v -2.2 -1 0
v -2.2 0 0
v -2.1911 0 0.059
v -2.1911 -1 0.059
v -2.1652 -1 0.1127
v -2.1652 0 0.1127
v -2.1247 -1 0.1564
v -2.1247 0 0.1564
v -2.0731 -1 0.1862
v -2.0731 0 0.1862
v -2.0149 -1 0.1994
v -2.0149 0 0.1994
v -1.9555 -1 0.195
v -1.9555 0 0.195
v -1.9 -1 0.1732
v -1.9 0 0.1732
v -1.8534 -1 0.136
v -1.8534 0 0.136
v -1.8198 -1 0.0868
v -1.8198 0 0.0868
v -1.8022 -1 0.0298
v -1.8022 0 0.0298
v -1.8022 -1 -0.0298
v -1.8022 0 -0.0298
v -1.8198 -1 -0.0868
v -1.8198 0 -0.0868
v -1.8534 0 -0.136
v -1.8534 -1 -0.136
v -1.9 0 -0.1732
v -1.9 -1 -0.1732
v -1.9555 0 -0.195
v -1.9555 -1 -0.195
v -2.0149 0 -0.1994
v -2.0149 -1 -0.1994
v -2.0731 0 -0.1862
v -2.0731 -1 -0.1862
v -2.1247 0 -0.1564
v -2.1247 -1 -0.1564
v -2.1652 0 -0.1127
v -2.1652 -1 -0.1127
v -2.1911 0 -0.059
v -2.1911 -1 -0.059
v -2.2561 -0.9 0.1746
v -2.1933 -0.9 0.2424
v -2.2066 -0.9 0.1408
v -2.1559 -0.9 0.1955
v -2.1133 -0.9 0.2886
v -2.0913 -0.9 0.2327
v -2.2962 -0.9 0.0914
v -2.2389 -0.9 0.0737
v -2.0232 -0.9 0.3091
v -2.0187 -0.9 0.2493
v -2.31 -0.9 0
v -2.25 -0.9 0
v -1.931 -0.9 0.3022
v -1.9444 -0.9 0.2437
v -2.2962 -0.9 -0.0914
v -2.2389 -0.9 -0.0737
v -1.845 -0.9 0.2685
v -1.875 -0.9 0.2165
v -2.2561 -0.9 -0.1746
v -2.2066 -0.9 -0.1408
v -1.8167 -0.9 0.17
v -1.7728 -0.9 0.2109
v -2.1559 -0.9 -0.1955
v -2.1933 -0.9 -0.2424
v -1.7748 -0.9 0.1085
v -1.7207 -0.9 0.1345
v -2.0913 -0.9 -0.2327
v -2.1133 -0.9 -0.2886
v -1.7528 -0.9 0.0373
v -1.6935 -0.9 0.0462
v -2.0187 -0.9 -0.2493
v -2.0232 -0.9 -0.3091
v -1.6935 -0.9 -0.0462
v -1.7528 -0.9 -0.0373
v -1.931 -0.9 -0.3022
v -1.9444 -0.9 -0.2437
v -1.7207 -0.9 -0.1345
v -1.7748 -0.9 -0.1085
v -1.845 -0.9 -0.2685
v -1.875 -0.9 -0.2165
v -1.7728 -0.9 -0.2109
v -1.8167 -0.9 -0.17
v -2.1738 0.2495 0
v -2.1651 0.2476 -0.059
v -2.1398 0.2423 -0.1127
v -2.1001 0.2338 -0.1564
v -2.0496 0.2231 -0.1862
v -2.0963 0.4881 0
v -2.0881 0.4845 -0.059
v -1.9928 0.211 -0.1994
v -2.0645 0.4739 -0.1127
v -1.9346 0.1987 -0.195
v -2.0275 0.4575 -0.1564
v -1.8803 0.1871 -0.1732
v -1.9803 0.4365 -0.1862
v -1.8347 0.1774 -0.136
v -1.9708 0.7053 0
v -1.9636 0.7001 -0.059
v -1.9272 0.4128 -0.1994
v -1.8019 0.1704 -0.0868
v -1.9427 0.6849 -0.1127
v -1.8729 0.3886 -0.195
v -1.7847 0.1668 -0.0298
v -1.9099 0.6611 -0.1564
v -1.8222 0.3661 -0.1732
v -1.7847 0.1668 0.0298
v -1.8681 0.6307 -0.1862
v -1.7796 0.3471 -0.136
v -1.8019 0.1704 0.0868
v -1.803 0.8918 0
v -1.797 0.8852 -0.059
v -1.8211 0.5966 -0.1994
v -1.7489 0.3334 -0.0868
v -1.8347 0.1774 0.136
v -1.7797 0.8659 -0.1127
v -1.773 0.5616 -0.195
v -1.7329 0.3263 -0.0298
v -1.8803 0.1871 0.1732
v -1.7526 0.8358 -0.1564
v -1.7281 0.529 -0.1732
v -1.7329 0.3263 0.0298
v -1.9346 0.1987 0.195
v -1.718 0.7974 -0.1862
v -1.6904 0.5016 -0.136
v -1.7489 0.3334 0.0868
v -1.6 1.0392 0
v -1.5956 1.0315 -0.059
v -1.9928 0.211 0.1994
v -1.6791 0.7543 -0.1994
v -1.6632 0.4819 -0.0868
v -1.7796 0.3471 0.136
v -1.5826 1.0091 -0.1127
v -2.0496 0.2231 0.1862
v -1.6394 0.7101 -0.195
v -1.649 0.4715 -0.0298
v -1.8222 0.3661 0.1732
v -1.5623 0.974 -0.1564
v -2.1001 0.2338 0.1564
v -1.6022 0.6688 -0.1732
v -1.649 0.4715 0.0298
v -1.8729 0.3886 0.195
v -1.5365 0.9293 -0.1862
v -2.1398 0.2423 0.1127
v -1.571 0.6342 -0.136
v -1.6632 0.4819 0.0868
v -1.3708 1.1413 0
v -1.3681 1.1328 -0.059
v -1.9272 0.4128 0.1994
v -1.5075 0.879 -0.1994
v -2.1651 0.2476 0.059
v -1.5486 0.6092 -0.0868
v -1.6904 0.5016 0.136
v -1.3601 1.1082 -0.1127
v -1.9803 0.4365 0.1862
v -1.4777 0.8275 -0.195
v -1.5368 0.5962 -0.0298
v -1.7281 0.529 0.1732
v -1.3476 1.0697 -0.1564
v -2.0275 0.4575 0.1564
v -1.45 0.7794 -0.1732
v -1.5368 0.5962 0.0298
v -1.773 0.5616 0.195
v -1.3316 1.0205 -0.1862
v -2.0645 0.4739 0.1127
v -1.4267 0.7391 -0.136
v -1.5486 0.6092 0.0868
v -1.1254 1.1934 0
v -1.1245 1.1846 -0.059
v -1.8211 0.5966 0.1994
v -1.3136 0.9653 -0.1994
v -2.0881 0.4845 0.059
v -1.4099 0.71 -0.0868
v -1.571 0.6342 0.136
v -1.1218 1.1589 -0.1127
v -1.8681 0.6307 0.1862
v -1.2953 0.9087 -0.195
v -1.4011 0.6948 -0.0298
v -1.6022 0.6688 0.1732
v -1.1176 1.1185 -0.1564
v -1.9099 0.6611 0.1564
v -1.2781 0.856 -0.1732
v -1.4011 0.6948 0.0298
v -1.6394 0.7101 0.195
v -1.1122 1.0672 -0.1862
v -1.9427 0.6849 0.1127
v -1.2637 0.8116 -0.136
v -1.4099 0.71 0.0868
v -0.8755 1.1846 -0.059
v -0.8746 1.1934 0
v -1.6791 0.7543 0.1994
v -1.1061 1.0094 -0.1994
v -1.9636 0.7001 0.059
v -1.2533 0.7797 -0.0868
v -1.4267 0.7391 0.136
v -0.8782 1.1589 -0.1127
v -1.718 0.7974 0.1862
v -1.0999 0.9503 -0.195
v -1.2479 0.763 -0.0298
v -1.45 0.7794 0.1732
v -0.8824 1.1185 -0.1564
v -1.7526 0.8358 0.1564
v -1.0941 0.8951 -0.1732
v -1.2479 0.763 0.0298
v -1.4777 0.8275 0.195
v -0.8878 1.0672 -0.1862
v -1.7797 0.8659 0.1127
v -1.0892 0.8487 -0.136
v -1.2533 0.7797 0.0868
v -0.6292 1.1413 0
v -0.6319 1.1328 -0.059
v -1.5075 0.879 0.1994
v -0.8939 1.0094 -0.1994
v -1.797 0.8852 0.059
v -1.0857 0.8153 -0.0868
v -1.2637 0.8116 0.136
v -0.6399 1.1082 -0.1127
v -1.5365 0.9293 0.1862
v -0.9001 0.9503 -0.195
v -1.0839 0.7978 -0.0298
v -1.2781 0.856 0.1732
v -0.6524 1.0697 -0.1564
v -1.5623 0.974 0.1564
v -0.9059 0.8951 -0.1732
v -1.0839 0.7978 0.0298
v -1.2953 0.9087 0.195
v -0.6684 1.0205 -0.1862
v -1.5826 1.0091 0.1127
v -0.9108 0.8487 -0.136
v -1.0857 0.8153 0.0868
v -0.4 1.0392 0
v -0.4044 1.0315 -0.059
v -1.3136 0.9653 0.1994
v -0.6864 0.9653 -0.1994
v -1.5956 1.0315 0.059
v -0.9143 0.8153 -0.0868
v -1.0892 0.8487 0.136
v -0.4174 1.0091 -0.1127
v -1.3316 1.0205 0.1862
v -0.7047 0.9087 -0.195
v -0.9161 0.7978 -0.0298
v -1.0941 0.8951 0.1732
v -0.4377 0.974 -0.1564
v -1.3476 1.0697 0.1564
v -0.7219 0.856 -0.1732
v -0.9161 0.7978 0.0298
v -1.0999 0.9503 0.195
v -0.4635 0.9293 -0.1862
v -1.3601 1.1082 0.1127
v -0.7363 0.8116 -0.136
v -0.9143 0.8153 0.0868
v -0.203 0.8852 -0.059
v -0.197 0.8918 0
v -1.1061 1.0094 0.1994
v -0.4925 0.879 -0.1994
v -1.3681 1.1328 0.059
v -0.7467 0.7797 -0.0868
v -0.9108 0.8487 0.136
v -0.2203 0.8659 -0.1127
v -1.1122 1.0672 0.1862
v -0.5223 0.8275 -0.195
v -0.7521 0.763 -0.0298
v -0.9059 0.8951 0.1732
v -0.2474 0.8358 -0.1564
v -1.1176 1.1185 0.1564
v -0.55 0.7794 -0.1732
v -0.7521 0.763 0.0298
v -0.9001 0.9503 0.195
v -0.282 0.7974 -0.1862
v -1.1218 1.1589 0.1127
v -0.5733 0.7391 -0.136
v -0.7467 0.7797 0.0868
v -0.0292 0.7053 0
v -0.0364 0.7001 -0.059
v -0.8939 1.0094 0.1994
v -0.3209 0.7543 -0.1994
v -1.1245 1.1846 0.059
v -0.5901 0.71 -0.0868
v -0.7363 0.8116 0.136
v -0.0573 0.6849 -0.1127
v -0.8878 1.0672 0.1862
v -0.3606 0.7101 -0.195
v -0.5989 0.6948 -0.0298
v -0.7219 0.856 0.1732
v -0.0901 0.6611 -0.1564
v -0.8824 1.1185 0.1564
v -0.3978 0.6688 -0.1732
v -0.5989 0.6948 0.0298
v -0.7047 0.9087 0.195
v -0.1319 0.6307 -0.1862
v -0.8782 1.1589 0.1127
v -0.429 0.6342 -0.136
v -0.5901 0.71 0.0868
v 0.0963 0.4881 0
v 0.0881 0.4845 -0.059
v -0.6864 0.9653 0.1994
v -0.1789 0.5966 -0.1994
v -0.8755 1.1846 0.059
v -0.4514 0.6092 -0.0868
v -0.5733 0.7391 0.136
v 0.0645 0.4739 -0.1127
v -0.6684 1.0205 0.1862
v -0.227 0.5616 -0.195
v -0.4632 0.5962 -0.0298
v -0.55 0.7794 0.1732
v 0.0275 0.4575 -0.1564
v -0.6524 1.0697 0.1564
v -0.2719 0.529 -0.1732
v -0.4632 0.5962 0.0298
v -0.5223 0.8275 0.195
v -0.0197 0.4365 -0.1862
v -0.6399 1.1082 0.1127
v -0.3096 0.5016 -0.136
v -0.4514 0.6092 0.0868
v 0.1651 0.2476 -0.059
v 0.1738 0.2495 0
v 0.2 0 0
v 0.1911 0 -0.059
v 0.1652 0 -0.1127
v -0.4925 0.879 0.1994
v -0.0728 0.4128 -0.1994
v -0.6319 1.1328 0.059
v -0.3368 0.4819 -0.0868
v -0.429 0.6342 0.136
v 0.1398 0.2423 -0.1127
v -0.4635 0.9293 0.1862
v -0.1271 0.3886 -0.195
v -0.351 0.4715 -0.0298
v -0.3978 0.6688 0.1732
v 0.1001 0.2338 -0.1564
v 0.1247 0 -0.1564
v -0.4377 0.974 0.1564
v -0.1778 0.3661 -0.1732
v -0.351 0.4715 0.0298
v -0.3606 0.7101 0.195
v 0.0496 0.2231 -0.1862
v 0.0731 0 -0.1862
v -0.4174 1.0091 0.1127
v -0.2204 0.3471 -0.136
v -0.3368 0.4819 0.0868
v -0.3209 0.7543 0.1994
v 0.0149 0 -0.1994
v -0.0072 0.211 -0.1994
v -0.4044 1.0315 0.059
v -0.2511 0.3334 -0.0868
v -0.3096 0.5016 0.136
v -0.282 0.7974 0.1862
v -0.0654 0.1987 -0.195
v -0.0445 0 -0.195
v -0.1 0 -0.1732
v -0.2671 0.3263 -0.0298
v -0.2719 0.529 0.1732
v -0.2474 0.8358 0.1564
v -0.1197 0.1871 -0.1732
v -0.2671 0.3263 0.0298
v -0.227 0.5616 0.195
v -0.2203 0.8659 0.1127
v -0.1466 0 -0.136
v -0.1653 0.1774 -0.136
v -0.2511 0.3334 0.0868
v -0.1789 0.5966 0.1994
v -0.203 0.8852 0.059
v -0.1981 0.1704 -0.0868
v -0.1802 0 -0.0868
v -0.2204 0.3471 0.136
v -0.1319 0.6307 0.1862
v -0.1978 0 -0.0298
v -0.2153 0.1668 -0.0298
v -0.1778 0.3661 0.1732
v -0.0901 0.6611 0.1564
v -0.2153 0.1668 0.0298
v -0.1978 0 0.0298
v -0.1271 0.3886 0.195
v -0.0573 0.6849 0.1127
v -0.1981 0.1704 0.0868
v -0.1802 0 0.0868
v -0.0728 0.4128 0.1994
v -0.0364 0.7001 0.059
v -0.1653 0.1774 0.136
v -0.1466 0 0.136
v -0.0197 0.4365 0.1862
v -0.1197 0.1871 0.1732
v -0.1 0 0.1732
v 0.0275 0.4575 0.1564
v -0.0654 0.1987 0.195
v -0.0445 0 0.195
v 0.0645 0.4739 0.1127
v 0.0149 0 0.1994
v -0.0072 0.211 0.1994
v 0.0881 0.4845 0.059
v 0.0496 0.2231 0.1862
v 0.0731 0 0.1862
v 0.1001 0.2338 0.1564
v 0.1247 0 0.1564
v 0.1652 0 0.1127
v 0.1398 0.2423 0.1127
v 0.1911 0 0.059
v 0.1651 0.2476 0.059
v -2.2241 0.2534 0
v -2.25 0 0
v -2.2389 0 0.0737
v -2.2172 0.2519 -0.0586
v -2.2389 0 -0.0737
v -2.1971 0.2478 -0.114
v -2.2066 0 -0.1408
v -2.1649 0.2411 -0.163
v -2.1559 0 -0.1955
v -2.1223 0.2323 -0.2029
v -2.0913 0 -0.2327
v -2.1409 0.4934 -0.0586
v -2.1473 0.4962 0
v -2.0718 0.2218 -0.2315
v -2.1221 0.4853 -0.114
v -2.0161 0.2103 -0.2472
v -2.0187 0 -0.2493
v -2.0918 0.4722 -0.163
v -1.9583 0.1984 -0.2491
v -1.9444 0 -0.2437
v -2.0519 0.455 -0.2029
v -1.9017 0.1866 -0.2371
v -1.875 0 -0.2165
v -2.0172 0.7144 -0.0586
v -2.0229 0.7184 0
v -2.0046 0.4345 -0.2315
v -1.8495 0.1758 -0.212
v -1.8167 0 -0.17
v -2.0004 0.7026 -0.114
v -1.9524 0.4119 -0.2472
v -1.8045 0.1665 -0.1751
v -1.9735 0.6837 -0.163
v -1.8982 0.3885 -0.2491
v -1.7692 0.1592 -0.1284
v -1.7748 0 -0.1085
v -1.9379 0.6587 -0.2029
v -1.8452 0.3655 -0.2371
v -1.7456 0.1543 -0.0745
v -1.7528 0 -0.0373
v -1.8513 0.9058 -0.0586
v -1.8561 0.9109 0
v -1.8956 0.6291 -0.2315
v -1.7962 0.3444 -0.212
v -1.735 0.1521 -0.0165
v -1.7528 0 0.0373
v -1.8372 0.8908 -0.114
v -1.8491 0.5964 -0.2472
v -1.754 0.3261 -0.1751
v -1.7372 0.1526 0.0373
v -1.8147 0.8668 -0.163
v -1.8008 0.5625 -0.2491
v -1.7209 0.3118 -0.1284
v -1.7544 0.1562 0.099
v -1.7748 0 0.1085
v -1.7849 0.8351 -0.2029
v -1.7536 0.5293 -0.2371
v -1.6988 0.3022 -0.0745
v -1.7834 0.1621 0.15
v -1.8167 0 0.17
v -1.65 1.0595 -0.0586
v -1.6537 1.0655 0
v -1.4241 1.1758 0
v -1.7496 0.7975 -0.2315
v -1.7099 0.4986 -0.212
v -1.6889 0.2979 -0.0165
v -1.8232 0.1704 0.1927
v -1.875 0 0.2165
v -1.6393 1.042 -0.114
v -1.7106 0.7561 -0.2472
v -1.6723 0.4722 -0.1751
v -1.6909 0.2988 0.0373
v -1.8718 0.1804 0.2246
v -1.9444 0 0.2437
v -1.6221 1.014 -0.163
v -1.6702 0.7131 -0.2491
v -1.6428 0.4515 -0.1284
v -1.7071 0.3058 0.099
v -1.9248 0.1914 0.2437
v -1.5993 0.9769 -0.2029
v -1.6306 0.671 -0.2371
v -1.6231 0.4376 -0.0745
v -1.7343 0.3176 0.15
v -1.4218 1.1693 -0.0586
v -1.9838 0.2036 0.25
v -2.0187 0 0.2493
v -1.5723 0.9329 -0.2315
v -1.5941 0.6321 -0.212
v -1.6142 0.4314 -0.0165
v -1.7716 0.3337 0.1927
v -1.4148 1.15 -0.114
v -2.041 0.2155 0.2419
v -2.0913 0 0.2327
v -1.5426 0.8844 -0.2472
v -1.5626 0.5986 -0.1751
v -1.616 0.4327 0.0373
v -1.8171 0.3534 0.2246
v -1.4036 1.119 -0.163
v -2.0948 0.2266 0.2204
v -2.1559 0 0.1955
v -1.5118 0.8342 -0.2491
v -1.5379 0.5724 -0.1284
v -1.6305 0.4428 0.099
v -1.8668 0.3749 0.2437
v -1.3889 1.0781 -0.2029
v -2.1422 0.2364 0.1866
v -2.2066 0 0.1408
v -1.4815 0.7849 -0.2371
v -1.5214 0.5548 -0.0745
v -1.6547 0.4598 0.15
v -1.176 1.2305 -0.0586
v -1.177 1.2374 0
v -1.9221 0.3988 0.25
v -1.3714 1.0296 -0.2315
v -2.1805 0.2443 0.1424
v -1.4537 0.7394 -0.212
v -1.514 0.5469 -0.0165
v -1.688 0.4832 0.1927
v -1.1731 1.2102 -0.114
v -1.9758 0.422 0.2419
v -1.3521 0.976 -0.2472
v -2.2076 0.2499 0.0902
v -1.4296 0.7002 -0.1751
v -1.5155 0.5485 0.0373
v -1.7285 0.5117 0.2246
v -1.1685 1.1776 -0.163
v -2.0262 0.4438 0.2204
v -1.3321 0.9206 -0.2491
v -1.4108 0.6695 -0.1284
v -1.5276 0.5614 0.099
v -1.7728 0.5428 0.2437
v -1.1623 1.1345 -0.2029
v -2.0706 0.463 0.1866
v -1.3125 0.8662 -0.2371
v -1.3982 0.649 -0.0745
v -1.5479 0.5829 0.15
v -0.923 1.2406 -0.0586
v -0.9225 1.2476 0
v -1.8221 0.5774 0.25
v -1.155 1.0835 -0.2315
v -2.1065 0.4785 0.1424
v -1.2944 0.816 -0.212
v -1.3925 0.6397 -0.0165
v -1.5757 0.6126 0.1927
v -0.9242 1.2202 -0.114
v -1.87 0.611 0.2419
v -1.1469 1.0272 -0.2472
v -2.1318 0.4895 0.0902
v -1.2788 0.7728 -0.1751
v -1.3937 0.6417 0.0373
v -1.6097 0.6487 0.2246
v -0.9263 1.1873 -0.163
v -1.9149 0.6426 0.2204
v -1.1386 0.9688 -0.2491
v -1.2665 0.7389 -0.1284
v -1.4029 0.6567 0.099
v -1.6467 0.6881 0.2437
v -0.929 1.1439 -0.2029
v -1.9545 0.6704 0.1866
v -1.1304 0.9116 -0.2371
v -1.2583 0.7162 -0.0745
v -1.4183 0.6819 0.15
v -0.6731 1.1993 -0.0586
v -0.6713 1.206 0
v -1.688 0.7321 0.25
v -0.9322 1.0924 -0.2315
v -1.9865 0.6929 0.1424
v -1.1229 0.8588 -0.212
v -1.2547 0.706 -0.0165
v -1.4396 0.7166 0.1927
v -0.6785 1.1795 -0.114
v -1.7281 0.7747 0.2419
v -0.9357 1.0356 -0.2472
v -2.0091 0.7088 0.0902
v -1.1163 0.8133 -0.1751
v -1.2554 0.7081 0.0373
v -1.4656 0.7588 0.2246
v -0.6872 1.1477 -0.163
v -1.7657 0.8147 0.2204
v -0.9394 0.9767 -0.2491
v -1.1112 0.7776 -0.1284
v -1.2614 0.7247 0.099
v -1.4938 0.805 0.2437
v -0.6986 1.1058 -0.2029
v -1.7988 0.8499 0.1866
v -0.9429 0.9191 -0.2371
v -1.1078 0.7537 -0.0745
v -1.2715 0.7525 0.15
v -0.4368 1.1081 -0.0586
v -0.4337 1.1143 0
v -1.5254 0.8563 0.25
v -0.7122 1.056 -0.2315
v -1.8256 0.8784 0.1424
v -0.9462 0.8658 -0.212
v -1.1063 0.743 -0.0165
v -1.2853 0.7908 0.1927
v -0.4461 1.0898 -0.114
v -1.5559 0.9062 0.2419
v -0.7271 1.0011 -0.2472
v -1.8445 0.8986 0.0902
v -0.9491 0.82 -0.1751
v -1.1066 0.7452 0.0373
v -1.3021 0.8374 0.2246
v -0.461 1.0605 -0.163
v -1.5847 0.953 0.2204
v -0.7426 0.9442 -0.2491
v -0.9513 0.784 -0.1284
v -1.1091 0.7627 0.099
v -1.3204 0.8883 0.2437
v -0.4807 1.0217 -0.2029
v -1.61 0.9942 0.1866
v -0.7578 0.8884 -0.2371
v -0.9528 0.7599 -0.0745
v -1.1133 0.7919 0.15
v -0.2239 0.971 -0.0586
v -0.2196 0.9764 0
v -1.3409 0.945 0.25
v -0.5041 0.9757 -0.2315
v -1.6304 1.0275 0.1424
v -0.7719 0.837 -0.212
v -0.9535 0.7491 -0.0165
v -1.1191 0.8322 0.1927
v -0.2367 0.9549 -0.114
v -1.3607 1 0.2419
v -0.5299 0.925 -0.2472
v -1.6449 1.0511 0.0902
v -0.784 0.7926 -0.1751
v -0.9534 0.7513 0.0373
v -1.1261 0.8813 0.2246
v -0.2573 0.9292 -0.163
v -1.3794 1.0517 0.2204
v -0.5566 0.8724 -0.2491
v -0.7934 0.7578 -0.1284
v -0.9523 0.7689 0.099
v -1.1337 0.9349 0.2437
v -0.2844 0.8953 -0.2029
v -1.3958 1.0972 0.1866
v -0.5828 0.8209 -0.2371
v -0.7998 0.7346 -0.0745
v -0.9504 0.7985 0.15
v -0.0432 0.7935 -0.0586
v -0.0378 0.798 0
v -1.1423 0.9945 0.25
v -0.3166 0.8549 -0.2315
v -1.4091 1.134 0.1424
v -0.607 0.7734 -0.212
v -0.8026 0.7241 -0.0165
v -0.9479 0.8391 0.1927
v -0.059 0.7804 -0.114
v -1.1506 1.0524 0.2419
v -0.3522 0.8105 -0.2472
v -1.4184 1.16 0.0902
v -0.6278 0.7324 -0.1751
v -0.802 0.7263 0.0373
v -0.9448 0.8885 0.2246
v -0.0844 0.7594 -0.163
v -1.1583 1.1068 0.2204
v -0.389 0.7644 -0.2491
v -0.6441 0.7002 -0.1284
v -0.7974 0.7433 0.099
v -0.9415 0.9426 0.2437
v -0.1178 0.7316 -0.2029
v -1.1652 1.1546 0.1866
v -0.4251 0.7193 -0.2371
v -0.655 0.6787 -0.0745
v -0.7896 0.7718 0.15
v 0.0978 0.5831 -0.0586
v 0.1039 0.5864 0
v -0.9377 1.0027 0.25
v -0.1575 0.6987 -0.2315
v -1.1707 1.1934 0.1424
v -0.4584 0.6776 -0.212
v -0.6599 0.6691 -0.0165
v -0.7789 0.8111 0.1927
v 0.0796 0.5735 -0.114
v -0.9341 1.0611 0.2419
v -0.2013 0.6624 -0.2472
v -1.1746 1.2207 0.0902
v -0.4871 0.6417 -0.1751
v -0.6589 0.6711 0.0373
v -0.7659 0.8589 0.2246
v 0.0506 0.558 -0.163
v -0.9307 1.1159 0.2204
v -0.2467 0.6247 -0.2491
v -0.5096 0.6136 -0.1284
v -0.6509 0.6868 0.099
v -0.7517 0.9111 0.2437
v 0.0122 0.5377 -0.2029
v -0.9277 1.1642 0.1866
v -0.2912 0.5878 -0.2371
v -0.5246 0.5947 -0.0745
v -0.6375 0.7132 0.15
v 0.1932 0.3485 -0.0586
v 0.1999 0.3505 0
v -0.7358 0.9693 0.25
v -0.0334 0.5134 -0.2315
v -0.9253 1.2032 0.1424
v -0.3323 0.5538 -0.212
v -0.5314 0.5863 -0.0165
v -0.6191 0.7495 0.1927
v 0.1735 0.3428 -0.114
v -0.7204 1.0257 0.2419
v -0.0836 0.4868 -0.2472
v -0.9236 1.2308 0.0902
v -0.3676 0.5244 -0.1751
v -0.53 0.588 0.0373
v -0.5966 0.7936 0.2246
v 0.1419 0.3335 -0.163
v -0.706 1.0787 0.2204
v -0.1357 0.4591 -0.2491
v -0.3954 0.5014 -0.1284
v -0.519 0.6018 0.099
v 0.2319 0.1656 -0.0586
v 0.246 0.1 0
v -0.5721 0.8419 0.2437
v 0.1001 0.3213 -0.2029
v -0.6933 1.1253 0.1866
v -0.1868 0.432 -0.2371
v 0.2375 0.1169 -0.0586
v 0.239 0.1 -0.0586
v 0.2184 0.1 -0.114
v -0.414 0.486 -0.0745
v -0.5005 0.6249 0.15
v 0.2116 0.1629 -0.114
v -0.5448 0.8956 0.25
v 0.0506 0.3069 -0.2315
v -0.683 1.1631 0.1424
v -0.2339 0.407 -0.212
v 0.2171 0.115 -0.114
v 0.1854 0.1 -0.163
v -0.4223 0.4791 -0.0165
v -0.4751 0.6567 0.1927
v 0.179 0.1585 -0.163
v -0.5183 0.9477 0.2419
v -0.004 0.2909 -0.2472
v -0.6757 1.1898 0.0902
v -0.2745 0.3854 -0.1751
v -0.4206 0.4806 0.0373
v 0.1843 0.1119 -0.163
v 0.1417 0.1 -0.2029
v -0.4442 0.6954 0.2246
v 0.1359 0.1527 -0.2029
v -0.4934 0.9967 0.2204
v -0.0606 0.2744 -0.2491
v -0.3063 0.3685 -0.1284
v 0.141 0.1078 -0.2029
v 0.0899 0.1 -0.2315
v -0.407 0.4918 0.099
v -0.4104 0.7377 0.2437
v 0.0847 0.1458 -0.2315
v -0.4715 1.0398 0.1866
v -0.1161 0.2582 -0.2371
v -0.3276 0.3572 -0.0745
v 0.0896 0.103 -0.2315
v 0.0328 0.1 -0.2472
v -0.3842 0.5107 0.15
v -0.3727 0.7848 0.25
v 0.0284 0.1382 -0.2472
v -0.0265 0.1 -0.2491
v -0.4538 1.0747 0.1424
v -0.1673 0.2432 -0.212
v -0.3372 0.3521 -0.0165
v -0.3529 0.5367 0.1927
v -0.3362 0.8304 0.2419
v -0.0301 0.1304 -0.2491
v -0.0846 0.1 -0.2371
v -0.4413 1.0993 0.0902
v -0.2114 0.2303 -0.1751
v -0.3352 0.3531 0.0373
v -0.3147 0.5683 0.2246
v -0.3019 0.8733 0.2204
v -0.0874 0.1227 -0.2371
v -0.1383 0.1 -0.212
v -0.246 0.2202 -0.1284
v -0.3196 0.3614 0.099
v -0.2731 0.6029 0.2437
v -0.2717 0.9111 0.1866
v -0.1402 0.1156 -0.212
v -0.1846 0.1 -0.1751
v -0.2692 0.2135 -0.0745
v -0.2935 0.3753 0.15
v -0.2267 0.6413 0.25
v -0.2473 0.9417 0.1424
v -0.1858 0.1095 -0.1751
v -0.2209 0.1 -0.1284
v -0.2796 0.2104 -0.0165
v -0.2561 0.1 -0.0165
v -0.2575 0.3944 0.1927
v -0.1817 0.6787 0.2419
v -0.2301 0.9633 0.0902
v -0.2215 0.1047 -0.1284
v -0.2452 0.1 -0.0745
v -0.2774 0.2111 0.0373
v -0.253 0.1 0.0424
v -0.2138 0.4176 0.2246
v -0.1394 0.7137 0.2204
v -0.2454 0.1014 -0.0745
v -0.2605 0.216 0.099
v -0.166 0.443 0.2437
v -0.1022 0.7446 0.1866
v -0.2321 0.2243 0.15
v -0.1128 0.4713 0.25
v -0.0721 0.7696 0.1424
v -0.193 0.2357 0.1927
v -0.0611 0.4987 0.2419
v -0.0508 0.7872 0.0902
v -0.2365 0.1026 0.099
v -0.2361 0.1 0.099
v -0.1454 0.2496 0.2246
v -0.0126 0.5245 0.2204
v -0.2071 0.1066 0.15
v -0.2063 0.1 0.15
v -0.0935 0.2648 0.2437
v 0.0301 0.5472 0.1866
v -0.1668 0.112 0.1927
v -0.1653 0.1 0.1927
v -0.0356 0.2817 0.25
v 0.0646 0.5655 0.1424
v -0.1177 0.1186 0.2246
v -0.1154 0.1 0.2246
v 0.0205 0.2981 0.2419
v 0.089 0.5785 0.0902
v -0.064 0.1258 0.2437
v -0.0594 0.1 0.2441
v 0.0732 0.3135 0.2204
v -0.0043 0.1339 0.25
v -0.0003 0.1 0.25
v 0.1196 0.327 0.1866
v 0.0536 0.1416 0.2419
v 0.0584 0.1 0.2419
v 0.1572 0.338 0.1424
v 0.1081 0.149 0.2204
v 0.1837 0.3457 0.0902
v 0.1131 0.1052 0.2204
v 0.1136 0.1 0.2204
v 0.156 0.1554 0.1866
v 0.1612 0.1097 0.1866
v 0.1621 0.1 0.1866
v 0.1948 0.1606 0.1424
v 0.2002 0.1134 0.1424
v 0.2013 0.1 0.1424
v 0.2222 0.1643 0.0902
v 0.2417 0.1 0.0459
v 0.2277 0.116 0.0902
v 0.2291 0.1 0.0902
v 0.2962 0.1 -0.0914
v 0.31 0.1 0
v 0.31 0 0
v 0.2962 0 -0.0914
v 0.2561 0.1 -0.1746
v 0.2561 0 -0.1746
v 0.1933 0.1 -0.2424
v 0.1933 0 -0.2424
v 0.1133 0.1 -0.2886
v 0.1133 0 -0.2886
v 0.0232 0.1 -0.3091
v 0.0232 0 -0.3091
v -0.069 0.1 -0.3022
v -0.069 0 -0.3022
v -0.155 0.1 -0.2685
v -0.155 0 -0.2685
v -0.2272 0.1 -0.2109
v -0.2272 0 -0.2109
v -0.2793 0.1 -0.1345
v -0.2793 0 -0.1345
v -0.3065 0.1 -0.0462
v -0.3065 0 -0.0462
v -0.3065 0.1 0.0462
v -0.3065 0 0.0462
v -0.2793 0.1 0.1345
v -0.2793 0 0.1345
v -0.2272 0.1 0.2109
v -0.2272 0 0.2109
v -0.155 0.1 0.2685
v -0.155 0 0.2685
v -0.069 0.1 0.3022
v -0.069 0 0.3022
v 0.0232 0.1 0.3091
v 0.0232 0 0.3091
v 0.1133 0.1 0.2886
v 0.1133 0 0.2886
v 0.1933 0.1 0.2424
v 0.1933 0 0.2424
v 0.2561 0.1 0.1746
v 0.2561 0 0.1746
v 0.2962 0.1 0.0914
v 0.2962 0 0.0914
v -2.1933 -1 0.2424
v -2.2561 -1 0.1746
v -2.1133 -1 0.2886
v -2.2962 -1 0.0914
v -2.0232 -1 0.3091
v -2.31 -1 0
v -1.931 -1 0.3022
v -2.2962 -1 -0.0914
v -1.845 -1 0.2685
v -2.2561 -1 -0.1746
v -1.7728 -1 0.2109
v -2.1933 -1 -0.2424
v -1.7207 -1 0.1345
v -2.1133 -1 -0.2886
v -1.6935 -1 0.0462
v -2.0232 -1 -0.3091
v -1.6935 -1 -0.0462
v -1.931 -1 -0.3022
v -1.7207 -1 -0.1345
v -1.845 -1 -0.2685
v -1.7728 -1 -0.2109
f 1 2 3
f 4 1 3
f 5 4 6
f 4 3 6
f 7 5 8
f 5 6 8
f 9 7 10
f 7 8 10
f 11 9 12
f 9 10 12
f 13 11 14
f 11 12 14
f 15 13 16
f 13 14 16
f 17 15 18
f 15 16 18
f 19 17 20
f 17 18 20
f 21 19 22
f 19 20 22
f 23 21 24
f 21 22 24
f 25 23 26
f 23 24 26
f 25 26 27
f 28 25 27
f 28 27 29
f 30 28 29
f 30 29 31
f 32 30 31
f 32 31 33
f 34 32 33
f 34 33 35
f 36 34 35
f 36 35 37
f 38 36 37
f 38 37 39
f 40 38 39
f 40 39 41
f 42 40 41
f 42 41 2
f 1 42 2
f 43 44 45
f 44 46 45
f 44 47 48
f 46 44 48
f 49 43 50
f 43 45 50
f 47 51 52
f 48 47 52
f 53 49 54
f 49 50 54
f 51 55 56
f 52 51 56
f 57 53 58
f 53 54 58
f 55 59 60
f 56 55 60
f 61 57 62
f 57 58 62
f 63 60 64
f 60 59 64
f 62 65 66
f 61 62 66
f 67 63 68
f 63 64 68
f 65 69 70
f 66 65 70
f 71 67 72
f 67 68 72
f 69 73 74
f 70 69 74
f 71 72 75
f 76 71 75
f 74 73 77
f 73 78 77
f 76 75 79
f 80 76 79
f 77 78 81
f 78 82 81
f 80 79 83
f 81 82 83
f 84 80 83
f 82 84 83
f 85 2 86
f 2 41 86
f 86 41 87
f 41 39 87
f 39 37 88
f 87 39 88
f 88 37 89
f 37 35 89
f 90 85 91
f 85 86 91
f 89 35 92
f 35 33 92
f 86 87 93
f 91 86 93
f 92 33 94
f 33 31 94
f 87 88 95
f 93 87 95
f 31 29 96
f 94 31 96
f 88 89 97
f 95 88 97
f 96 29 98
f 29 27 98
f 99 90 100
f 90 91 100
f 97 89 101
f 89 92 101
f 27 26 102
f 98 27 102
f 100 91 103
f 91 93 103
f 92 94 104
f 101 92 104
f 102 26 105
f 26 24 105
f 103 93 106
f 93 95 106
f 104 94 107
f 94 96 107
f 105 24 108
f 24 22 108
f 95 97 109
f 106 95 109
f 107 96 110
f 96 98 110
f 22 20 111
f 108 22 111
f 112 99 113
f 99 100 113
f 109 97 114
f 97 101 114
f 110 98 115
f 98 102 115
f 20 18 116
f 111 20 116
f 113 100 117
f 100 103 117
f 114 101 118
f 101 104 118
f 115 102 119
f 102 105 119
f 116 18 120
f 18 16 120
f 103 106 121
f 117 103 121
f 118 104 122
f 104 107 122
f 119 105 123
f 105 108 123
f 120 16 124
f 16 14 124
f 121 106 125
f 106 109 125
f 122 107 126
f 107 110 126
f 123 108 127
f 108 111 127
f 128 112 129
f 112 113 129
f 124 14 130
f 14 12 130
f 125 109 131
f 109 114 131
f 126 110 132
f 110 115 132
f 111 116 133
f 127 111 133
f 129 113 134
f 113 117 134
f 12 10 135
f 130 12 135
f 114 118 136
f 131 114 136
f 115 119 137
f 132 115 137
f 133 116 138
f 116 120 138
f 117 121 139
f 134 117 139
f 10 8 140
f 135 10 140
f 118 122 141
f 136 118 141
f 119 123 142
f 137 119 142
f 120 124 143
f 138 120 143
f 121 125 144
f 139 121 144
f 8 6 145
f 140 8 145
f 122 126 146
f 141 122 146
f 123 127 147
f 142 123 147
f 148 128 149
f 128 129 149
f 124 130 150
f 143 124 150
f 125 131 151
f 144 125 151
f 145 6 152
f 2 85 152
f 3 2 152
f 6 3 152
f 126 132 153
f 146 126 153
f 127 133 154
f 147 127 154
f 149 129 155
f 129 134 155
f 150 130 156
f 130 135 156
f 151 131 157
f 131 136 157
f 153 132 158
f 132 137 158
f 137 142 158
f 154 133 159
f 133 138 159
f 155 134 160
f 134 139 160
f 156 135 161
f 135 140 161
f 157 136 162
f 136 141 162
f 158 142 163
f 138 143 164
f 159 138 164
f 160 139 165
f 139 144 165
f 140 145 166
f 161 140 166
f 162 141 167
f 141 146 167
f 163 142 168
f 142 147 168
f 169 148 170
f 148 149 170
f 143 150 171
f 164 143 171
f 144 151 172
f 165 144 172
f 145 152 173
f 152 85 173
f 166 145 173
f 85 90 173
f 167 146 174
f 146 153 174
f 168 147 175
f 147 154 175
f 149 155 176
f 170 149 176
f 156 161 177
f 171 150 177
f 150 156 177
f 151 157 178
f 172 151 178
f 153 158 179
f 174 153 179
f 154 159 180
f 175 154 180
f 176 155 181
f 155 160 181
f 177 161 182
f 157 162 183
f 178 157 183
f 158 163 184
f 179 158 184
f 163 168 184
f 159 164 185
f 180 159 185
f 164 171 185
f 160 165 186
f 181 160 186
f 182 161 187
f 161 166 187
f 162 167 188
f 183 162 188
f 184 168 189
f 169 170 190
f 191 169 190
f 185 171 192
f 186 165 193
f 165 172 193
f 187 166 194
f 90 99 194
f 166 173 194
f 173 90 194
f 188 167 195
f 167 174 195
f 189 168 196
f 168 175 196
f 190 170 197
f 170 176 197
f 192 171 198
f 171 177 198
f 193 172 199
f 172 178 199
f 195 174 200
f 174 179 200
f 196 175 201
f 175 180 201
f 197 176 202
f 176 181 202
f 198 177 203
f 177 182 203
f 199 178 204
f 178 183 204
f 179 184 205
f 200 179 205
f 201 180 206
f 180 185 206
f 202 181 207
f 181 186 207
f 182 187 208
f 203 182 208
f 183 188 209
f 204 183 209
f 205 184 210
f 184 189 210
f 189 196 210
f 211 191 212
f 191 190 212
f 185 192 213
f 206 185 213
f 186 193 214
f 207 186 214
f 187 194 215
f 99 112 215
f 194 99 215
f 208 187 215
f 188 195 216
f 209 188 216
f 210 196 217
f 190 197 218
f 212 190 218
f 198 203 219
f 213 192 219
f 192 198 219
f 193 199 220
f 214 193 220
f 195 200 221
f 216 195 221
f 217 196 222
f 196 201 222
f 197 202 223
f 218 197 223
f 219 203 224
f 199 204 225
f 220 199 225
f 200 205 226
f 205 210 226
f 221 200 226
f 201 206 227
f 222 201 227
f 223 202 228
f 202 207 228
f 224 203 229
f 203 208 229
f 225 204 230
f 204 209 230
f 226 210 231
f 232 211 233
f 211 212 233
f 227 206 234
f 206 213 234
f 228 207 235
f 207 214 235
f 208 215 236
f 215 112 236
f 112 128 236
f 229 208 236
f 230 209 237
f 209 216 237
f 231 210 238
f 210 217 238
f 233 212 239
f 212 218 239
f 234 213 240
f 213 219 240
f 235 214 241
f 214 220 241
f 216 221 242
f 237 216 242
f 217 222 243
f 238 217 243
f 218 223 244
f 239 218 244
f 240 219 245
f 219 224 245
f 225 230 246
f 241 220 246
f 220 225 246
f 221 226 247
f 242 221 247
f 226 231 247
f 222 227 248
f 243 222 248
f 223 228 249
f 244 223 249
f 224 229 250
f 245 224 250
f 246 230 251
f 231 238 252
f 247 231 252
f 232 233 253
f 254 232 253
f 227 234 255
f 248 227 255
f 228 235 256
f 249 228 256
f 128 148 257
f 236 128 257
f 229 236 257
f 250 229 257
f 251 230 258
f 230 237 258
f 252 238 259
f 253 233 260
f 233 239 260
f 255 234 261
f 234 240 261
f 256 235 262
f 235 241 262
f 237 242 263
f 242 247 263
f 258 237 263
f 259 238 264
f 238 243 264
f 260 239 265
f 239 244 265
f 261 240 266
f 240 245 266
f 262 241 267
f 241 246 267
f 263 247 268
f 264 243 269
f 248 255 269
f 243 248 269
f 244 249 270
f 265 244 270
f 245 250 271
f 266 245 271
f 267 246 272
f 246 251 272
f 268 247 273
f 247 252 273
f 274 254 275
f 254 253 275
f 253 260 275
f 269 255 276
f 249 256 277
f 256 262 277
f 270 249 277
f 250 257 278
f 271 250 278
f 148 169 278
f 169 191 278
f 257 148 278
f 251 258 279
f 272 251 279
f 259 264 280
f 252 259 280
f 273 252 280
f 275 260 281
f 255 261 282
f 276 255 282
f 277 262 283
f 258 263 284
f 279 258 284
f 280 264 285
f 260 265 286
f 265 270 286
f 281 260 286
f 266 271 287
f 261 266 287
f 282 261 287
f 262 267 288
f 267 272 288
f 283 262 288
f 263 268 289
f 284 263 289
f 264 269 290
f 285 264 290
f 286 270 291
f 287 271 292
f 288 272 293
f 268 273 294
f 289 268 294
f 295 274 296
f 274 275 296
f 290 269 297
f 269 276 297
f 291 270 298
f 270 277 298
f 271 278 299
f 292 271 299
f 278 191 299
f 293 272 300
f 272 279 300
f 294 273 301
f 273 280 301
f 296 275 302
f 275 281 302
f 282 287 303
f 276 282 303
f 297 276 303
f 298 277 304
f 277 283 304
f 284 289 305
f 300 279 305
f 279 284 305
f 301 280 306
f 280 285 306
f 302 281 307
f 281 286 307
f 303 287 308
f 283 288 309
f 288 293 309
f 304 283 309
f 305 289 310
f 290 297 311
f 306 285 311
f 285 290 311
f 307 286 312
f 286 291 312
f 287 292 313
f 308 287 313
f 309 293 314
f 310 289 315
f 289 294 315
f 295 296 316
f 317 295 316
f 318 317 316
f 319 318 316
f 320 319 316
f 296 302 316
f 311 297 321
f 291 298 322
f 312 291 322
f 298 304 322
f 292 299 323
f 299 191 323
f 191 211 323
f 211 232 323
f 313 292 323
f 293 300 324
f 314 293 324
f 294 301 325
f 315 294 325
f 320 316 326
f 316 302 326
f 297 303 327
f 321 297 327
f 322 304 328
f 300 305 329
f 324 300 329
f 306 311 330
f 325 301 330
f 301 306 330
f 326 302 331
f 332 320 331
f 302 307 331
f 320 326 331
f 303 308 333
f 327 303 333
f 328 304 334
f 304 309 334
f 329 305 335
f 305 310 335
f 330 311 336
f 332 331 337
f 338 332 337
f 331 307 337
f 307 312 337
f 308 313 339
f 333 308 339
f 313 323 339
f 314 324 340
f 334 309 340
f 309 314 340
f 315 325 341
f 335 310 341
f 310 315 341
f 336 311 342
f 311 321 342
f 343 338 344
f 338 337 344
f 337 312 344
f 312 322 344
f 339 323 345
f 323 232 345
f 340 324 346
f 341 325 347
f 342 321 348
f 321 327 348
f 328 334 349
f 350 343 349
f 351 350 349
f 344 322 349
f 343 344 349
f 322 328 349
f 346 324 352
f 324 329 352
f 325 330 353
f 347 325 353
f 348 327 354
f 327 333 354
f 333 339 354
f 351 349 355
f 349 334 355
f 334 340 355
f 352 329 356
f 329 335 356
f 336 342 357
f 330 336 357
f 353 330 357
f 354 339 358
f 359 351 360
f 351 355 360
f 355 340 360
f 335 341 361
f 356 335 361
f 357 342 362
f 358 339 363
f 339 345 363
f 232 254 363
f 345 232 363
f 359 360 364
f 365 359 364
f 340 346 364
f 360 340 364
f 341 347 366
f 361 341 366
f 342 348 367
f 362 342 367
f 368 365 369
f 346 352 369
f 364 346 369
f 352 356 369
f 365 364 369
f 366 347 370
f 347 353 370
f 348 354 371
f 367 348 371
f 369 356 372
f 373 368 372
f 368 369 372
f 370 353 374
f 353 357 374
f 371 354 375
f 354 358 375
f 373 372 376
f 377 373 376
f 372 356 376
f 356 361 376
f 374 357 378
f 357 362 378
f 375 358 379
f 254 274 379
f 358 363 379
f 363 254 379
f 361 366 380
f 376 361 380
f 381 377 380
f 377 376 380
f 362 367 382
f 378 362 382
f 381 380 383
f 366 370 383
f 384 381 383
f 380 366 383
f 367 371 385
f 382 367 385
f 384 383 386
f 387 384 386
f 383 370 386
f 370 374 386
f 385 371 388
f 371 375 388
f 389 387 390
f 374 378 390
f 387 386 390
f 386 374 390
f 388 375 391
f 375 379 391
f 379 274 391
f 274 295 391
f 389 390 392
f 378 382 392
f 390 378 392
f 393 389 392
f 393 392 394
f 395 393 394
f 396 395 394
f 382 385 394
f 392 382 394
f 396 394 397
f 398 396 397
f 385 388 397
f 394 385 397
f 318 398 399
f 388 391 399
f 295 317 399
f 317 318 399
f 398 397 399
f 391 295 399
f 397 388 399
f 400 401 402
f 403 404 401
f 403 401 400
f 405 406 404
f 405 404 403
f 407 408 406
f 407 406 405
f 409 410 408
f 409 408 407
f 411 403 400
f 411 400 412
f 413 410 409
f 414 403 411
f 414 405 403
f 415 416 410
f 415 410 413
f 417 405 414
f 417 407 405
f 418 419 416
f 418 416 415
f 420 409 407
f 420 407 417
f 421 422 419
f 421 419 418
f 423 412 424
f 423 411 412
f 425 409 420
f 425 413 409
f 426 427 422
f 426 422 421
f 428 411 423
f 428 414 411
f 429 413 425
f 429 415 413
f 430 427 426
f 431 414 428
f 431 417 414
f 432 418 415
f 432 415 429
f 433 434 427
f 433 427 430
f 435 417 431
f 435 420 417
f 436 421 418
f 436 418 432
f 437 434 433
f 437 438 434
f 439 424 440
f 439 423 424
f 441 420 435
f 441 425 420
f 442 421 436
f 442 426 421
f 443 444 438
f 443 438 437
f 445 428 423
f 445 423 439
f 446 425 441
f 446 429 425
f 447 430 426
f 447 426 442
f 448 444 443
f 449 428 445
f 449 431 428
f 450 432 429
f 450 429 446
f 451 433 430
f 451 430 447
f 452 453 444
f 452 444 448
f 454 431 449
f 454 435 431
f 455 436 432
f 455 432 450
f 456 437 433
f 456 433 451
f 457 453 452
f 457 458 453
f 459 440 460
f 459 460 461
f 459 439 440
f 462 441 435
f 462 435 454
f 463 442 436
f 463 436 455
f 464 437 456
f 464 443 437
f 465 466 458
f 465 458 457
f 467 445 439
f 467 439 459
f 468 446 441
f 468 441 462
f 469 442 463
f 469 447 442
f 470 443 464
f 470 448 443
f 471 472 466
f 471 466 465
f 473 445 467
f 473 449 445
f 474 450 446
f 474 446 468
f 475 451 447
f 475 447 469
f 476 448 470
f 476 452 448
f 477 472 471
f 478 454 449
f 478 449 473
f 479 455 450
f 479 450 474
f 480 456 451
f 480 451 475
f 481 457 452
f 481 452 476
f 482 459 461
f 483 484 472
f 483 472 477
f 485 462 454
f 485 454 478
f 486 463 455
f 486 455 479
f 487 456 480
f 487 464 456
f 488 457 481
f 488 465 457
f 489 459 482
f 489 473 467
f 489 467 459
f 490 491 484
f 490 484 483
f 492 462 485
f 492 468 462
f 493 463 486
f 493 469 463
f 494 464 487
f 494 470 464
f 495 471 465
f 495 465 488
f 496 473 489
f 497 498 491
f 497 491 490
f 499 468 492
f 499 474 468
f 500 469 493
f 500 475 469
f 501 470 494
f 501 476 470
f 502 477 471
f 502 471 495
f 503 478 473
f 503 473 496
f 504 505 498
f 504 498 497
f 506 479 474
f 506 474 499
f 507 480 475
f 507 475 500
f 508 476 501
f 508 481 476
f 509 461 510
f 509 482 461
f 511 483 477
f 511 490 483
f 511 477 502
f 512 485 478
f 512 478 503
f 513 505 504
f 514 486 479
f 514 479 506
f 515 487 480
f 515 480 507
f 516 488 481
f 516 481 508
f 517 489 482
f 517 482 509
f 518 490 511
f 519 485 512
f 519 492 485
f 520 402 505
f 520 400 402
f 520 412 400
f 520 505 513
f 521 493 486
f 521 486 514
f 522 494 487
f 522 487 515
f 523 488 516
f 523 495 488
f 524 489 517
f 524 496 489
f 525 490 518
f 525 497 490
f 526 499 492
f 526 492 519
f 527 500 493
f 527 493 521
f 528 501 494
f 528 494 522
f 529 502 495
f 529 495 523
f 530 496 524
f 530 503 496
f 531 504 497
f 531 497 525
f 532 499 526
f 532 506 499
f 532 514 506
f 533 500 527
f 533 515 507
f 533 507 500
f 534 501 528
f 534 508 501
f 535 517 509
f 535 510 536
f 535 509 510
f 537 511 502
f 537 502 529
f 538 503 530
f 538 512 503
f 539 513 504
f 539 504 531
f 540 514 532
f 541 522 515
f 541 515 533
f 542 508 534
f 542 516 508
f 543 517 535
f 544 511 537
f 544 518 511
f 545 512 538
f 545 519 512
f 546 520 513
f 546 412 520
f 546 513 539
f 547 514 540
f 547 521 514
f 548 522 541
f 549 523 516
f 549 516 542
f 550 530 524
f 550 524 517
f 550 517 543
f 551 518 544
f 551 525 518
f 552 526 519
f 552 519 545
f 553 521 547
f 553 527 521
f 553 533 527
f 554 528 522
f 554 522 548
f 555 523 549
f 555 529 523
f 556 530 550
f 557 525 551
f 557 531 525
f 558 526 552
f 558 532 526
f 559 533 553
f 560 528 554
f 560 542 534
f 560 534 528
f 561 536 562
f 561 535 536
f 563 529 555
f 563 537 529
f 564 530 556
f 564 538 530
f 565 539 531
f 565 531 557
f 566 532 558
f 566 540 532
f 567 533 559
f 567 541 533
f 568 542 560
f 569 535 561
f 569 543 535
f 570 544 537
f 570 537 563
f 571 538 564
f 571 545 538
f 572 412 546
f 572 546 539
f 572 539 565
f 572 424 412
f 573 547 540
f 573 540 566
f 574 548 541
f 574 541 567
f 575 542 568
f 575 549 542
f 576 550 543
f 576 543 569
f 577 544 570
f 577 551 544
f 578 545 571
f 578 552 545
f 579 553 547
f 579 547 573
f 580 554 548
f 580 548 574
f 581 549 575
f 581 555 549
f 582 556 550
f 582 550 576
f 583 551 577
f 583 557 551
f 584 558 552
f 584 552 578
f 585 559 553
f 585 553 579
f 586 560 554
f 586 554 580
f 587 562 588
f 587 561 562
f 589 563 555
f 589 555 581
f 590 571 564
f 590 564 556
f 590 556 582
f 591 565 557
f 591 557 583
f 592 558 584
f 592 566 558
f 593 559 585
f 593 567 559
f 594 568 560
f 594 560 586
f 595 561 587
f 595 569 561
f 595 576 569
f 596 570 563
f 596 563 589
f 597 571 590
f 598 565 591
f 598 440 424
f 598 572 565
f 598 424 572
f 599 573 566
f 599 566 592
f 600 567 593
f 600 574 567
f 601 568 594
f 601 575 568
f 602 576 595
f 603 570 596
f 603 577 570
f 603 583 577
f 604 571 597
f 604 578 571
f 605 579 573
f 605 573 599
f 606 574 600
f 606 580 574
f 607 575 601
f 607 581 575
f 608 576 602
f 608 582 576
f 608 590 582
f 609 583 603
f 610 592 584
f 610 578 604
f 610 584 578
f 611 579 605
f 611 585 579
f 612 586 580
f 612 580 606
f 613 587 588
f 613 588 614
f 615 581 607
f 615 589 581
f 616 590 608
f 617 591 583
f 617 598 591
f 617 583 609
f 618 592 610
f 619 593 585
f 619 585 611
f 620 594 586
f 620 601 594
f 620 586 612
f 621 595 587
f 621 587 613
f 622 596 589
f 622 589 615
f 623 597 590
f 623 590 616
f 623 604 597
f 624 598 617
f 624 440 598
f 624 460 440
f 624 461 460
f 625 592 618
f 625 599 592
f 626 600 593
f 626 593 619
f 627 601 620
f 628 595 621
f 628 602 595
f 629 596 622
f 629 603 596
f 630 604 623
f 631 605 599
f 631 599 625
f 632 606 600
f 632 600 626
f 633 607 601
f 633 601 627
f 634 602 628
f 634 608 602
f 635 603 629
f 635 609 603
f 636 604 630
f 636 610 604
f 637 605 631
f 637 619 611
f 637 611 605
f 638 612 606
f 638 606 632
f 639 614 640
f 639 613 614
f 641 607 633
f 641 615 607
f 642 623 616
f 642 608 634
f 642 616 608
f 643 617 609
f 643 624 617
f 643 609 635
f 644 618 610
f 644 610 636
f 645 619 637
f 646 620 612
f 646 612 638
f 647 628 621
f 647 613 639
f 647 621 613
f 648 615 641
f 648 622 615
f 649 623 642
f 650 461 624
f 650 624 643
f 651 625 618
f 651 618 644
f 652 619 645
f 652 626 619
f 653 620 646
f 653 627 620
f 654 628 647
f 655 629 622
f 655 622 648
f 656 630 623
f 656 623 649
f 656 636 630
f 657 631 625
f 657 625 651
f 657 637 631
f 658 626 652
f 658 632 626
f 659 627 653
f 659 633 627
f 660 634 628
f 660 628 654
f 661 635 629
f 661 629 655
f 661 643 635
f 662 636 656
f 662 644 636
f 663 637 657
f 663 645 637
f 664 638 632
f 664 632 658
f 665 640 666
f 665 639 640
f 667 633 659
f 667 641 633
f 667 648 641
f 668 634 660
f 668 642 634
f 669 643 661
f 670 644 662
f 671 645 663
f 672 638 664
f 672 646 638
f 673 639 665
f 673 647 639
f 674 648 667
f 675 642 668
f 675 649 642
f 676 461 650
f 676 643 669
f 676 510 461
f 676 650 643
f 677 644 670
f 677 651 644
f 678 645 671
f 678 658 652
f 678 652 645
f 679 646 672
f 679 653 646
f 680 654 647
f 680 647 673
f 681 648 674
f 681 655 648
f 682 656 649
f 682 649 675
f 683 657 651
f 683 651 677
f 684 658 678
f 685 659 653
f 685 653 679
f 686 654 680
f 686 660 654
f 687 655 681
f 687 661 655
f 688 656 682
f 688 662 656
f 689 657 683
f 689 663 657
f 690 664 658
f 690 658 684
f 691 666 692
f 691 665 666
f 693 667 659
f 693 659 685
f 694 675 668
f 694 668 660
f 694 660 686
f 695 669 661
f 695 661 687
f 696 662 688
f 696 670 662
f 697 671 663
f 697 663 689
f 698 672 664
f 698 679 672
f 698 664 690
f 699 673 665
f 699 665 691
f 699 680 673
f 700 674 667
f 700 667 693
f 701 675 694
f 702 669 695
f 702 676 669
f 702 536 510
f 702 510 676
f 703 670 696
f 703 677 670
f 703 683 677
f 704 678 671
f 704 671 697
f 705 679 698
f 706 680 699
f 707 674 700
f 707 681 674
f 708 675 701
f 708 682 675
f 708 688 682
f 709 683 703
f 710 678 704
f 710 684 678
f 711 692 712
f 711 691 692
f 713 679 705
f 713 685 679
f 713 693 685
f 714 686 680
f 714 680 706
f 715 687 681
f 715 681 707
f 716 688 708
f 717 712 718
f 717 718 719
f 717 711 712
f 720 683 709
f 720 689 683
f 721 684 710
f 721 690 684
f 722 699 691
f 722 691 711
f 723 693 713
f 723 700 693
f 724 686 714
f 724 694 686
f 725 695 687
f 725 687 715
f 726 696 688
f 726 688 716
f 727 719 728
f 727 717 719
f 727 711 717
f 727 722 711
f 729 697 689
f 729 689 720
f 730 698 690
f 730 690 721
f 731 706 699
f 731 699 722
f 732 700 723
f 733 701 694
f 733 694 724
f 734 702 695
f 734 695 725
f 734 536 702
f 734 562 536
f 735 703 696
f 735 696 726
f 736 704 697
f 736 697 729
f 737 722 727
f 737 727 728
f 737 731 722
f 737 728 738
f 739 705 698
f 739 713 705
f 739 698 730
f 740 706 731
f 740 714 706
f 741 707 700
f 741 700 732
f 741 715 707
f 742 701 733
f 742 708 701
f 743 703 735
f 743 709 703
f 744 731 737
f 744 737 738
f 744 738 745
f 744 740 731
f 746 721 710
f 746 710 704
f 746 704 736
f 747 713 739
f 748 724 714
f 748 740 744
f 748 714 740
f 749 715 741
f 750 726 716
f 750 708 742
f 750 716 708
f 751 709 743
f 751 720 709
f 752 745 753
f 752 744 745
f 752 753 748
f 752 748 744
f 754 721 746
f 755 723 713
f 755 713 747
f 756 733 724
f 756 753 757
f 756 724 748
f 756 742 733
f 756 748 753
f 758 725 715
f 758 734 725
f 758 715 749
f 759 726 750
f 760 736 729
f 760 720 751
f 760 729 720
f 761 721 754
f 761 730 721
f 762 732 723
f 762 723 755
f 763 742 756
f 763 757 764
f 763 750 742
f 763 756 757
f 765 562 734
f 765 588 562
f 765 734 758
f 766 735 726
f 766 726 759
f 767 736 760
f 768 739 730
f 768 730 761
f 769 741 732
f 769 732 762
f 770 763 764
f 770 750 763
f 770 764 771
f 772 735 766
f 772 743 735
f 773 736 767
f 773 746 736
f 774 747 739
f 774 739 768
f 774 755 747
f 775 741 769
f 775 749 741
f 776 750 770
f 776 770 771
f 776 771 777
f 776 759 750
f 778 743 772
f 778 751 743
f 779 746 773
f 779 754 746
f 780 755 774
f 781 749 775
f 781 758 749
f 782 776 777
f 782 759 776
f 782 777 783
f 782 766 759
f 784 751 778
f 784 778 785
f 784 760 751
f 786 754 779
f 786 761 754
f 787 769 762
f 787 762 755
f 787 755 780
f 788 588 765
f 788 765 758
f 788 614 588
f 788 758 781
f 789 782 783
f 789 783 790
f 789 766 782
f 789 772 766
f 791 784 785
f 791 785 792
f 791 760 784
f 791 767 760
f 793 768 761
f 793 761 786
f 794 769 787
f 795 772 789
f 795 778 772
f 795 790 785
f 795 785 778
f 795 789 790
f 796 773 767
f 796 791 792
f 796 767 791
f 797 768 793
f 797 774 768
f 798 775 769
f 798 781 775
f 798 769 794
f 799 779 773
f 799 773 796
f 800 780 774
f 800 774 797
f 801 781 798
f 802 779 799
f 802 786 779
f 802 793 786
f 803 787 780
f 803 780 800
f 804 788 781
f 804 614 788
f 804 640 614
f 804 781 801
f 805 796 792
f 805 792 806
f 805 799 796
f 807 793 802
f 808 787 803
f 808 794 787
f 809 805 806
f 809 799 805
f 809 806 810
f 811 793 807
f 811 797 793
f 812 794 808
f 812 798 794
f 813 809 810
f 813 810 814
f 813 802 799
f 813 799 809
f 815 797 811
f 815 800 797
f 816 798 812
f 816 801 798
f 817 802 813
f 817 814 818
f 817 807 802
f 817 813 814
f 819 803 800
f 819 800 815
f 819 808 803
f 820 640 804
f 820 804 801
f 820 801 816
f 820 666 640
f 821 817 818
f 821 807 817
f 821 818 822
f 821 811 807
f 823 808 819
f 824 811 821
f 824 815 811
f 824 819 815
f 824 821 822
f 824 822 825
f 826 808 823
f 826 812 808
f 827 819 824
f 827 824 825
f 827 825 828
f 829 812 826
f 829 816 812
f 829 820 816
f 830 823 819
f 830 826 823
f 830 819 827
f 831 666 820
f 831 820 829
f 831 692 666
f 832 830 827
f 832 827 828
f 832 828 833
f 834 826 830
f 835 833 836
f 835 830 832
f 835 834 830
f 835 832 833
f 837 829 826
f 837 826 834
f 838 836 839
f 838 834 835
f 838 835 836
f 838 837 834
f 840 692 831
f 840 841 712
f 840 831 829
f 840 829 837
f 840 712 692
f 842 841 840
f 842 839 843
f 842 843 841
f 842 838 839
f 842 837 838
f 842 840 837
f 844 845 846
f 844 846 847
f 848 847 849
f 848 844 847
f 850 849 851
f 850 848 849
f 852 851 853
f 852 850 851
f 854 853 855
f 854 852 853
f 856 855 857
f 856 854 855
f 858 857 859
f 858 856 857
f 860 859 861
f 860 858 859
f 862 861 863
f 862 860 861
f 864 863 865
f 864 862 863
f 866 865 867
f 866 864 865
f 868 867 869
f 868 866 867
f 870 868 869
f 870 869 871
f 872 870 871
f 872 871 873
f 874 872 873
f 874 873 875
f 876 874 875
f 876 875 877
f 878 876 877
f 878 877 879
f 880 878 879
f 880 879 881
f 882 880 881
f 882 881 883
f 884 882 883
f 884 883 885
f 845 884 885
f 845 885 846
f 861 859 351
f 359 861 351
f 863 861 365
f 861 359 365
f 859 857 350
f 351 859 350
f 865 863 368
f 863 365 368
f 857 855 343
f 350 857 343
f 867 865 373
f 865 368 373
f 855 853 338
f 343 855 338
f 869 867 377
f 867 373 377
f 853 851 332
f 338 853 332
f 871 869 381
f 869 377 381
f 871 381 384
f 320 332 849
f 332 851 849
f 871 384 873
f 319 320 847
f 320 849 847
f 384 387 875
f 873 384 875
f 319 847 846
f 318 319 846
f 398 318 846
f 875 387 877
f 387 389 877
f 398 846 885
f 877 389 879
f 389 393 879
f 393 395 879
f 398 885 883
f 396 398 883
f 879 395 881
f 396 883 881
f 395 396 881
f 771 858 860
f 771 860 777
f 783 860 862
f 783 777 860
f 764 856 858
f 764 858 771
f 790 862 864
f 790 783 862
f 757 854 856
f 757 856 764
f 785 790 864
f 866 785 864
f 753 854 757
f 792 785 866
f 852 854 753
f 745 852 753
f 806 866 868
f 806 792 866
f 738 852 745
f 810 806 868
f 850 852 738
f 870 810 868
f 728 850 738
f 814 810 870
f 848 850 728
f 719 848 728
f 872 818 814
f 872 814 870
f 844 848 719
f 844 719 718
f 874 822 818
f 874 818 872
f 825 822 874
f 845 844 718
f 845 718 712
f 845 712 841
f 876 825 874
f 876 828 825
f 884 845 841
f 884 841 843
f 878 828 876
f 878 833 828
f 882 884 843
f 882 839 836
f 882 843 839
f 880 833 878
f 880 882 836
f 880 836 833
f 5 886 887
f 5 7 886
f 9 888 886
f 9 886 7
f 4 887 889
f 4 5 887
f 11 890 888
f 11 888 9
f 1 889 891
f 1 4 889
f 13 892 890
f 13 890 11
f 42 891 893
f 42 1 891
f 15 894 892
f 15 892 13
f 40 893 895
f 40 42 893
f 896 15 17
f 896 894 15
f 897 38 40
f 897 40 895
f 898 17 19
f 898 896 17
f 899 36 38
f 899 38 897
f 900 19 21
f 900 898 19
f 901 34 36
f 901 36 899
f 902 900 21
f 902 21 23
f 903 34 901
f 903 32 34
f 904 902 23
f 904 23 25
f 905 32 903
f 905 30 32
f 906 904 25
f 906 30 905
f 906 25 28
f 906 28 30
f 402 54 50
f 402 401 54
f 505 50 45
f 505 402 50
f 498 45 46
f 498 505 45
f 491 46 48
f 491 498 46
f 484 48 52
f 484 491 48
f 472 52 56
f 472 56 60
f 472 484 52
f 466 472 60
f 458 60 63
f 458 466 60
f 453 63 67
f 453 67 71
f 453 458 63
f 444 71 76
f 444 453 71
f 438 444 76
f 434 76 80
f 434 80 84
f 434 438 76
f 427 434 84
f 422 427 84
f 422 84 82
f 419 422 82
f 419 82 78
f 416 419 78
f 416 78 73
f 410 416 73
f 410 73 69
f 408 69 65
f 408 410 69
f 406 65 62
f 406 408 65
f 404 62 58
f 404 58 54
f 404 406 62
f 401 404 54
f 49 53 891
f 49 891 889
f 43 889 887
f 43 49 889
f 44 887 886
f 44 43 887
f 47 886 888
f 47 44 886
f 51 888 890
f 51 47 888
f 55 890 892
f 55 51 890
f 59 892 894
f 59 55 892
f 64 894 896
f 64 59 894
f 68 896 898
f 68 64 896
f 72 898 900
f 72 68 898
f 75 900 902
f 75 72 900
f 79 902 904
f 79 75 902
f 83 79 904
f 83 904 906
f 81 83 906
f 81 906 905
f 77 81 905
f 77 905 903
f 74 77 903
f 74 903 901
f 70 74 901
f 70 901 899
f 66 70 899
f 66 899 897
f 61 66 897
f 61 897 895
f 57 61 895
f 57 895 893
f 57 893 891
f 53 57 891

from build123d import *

# Parameters (mm, degrees)
SKETCH3_R    = 0.25
SKETCH3_R_2  = 0.2
SKETCH6_R    = 0.31
SKETCH6_R_2  = 0.21
SKETCH10_R   = 0.31
SKETCH10_R_2 = 0.21


with BuildPart() as part:
    # Sweep-Thin1: sweep along a path in Sketch1
    with BuildLine(Plane.XY) as sweep_thin1_path:
        Line((-2, -1), (-2, 0))
        ThreePointArc((-2, 0), (-1, 1), (0, 0))
    # Sketch3 → Sweep-Thin1 (sweep)
    with BuildSketch(Plane(origin=(0, 0, 0), x_dir=(1, 0, 0), z_dir=(0, 1, 0))):
        Circle(SKETCH3_R)
        Circle(SKETCH3_R_2, mode=Mode.SUBTRACT)
    sweep(path=sweep_thin1_path.line)

    # Sweep-Thin2: sweep along a path in Sketch5
    with BuildLine(Plane.XY) as sweep_thin2_path:
        Line((0, 0), (0, 0.1))
    # Sketch6 → Sweep-Thin2 (sweep)
    with BuildSketch(Plane(origin=(0, 0, 0), x_dir=(1, 0, 0), z_dir=(0, 1, 0))):
        Circle(SKETCH6_R)
        Circle(SKETCH6_R_2, mode=Mode.SUBTRACT)
    sweep(path=sweep_thin2_path.line)

    # Sweep-Thin3: sweep along a path in Sketch9
    with BuildLine(Plane(origin=(-2, 0, 0), x_dir=(0, 0, -1), z_dir=(1, 0, 0))) as sweep_thin3_path:
        Line((0, -1), (0, -0.9))
    # Sketch10 → Sweep-Thin3 (sweep)
    with BuildSketch(Plane(origin=(0, -1, 0), x_dir=(-1, 0, 0), z_dir=(0, -1, 0))):
        with Locations((2, 0)):
            Circle(SKETCH10_R)
        with Locations((2, 0)):
            Circle(SKETCH10_R_2, mode=Mode.SUBTRACT)
    sweep(path=sweep_thin3_path.line)


solid = part.part
